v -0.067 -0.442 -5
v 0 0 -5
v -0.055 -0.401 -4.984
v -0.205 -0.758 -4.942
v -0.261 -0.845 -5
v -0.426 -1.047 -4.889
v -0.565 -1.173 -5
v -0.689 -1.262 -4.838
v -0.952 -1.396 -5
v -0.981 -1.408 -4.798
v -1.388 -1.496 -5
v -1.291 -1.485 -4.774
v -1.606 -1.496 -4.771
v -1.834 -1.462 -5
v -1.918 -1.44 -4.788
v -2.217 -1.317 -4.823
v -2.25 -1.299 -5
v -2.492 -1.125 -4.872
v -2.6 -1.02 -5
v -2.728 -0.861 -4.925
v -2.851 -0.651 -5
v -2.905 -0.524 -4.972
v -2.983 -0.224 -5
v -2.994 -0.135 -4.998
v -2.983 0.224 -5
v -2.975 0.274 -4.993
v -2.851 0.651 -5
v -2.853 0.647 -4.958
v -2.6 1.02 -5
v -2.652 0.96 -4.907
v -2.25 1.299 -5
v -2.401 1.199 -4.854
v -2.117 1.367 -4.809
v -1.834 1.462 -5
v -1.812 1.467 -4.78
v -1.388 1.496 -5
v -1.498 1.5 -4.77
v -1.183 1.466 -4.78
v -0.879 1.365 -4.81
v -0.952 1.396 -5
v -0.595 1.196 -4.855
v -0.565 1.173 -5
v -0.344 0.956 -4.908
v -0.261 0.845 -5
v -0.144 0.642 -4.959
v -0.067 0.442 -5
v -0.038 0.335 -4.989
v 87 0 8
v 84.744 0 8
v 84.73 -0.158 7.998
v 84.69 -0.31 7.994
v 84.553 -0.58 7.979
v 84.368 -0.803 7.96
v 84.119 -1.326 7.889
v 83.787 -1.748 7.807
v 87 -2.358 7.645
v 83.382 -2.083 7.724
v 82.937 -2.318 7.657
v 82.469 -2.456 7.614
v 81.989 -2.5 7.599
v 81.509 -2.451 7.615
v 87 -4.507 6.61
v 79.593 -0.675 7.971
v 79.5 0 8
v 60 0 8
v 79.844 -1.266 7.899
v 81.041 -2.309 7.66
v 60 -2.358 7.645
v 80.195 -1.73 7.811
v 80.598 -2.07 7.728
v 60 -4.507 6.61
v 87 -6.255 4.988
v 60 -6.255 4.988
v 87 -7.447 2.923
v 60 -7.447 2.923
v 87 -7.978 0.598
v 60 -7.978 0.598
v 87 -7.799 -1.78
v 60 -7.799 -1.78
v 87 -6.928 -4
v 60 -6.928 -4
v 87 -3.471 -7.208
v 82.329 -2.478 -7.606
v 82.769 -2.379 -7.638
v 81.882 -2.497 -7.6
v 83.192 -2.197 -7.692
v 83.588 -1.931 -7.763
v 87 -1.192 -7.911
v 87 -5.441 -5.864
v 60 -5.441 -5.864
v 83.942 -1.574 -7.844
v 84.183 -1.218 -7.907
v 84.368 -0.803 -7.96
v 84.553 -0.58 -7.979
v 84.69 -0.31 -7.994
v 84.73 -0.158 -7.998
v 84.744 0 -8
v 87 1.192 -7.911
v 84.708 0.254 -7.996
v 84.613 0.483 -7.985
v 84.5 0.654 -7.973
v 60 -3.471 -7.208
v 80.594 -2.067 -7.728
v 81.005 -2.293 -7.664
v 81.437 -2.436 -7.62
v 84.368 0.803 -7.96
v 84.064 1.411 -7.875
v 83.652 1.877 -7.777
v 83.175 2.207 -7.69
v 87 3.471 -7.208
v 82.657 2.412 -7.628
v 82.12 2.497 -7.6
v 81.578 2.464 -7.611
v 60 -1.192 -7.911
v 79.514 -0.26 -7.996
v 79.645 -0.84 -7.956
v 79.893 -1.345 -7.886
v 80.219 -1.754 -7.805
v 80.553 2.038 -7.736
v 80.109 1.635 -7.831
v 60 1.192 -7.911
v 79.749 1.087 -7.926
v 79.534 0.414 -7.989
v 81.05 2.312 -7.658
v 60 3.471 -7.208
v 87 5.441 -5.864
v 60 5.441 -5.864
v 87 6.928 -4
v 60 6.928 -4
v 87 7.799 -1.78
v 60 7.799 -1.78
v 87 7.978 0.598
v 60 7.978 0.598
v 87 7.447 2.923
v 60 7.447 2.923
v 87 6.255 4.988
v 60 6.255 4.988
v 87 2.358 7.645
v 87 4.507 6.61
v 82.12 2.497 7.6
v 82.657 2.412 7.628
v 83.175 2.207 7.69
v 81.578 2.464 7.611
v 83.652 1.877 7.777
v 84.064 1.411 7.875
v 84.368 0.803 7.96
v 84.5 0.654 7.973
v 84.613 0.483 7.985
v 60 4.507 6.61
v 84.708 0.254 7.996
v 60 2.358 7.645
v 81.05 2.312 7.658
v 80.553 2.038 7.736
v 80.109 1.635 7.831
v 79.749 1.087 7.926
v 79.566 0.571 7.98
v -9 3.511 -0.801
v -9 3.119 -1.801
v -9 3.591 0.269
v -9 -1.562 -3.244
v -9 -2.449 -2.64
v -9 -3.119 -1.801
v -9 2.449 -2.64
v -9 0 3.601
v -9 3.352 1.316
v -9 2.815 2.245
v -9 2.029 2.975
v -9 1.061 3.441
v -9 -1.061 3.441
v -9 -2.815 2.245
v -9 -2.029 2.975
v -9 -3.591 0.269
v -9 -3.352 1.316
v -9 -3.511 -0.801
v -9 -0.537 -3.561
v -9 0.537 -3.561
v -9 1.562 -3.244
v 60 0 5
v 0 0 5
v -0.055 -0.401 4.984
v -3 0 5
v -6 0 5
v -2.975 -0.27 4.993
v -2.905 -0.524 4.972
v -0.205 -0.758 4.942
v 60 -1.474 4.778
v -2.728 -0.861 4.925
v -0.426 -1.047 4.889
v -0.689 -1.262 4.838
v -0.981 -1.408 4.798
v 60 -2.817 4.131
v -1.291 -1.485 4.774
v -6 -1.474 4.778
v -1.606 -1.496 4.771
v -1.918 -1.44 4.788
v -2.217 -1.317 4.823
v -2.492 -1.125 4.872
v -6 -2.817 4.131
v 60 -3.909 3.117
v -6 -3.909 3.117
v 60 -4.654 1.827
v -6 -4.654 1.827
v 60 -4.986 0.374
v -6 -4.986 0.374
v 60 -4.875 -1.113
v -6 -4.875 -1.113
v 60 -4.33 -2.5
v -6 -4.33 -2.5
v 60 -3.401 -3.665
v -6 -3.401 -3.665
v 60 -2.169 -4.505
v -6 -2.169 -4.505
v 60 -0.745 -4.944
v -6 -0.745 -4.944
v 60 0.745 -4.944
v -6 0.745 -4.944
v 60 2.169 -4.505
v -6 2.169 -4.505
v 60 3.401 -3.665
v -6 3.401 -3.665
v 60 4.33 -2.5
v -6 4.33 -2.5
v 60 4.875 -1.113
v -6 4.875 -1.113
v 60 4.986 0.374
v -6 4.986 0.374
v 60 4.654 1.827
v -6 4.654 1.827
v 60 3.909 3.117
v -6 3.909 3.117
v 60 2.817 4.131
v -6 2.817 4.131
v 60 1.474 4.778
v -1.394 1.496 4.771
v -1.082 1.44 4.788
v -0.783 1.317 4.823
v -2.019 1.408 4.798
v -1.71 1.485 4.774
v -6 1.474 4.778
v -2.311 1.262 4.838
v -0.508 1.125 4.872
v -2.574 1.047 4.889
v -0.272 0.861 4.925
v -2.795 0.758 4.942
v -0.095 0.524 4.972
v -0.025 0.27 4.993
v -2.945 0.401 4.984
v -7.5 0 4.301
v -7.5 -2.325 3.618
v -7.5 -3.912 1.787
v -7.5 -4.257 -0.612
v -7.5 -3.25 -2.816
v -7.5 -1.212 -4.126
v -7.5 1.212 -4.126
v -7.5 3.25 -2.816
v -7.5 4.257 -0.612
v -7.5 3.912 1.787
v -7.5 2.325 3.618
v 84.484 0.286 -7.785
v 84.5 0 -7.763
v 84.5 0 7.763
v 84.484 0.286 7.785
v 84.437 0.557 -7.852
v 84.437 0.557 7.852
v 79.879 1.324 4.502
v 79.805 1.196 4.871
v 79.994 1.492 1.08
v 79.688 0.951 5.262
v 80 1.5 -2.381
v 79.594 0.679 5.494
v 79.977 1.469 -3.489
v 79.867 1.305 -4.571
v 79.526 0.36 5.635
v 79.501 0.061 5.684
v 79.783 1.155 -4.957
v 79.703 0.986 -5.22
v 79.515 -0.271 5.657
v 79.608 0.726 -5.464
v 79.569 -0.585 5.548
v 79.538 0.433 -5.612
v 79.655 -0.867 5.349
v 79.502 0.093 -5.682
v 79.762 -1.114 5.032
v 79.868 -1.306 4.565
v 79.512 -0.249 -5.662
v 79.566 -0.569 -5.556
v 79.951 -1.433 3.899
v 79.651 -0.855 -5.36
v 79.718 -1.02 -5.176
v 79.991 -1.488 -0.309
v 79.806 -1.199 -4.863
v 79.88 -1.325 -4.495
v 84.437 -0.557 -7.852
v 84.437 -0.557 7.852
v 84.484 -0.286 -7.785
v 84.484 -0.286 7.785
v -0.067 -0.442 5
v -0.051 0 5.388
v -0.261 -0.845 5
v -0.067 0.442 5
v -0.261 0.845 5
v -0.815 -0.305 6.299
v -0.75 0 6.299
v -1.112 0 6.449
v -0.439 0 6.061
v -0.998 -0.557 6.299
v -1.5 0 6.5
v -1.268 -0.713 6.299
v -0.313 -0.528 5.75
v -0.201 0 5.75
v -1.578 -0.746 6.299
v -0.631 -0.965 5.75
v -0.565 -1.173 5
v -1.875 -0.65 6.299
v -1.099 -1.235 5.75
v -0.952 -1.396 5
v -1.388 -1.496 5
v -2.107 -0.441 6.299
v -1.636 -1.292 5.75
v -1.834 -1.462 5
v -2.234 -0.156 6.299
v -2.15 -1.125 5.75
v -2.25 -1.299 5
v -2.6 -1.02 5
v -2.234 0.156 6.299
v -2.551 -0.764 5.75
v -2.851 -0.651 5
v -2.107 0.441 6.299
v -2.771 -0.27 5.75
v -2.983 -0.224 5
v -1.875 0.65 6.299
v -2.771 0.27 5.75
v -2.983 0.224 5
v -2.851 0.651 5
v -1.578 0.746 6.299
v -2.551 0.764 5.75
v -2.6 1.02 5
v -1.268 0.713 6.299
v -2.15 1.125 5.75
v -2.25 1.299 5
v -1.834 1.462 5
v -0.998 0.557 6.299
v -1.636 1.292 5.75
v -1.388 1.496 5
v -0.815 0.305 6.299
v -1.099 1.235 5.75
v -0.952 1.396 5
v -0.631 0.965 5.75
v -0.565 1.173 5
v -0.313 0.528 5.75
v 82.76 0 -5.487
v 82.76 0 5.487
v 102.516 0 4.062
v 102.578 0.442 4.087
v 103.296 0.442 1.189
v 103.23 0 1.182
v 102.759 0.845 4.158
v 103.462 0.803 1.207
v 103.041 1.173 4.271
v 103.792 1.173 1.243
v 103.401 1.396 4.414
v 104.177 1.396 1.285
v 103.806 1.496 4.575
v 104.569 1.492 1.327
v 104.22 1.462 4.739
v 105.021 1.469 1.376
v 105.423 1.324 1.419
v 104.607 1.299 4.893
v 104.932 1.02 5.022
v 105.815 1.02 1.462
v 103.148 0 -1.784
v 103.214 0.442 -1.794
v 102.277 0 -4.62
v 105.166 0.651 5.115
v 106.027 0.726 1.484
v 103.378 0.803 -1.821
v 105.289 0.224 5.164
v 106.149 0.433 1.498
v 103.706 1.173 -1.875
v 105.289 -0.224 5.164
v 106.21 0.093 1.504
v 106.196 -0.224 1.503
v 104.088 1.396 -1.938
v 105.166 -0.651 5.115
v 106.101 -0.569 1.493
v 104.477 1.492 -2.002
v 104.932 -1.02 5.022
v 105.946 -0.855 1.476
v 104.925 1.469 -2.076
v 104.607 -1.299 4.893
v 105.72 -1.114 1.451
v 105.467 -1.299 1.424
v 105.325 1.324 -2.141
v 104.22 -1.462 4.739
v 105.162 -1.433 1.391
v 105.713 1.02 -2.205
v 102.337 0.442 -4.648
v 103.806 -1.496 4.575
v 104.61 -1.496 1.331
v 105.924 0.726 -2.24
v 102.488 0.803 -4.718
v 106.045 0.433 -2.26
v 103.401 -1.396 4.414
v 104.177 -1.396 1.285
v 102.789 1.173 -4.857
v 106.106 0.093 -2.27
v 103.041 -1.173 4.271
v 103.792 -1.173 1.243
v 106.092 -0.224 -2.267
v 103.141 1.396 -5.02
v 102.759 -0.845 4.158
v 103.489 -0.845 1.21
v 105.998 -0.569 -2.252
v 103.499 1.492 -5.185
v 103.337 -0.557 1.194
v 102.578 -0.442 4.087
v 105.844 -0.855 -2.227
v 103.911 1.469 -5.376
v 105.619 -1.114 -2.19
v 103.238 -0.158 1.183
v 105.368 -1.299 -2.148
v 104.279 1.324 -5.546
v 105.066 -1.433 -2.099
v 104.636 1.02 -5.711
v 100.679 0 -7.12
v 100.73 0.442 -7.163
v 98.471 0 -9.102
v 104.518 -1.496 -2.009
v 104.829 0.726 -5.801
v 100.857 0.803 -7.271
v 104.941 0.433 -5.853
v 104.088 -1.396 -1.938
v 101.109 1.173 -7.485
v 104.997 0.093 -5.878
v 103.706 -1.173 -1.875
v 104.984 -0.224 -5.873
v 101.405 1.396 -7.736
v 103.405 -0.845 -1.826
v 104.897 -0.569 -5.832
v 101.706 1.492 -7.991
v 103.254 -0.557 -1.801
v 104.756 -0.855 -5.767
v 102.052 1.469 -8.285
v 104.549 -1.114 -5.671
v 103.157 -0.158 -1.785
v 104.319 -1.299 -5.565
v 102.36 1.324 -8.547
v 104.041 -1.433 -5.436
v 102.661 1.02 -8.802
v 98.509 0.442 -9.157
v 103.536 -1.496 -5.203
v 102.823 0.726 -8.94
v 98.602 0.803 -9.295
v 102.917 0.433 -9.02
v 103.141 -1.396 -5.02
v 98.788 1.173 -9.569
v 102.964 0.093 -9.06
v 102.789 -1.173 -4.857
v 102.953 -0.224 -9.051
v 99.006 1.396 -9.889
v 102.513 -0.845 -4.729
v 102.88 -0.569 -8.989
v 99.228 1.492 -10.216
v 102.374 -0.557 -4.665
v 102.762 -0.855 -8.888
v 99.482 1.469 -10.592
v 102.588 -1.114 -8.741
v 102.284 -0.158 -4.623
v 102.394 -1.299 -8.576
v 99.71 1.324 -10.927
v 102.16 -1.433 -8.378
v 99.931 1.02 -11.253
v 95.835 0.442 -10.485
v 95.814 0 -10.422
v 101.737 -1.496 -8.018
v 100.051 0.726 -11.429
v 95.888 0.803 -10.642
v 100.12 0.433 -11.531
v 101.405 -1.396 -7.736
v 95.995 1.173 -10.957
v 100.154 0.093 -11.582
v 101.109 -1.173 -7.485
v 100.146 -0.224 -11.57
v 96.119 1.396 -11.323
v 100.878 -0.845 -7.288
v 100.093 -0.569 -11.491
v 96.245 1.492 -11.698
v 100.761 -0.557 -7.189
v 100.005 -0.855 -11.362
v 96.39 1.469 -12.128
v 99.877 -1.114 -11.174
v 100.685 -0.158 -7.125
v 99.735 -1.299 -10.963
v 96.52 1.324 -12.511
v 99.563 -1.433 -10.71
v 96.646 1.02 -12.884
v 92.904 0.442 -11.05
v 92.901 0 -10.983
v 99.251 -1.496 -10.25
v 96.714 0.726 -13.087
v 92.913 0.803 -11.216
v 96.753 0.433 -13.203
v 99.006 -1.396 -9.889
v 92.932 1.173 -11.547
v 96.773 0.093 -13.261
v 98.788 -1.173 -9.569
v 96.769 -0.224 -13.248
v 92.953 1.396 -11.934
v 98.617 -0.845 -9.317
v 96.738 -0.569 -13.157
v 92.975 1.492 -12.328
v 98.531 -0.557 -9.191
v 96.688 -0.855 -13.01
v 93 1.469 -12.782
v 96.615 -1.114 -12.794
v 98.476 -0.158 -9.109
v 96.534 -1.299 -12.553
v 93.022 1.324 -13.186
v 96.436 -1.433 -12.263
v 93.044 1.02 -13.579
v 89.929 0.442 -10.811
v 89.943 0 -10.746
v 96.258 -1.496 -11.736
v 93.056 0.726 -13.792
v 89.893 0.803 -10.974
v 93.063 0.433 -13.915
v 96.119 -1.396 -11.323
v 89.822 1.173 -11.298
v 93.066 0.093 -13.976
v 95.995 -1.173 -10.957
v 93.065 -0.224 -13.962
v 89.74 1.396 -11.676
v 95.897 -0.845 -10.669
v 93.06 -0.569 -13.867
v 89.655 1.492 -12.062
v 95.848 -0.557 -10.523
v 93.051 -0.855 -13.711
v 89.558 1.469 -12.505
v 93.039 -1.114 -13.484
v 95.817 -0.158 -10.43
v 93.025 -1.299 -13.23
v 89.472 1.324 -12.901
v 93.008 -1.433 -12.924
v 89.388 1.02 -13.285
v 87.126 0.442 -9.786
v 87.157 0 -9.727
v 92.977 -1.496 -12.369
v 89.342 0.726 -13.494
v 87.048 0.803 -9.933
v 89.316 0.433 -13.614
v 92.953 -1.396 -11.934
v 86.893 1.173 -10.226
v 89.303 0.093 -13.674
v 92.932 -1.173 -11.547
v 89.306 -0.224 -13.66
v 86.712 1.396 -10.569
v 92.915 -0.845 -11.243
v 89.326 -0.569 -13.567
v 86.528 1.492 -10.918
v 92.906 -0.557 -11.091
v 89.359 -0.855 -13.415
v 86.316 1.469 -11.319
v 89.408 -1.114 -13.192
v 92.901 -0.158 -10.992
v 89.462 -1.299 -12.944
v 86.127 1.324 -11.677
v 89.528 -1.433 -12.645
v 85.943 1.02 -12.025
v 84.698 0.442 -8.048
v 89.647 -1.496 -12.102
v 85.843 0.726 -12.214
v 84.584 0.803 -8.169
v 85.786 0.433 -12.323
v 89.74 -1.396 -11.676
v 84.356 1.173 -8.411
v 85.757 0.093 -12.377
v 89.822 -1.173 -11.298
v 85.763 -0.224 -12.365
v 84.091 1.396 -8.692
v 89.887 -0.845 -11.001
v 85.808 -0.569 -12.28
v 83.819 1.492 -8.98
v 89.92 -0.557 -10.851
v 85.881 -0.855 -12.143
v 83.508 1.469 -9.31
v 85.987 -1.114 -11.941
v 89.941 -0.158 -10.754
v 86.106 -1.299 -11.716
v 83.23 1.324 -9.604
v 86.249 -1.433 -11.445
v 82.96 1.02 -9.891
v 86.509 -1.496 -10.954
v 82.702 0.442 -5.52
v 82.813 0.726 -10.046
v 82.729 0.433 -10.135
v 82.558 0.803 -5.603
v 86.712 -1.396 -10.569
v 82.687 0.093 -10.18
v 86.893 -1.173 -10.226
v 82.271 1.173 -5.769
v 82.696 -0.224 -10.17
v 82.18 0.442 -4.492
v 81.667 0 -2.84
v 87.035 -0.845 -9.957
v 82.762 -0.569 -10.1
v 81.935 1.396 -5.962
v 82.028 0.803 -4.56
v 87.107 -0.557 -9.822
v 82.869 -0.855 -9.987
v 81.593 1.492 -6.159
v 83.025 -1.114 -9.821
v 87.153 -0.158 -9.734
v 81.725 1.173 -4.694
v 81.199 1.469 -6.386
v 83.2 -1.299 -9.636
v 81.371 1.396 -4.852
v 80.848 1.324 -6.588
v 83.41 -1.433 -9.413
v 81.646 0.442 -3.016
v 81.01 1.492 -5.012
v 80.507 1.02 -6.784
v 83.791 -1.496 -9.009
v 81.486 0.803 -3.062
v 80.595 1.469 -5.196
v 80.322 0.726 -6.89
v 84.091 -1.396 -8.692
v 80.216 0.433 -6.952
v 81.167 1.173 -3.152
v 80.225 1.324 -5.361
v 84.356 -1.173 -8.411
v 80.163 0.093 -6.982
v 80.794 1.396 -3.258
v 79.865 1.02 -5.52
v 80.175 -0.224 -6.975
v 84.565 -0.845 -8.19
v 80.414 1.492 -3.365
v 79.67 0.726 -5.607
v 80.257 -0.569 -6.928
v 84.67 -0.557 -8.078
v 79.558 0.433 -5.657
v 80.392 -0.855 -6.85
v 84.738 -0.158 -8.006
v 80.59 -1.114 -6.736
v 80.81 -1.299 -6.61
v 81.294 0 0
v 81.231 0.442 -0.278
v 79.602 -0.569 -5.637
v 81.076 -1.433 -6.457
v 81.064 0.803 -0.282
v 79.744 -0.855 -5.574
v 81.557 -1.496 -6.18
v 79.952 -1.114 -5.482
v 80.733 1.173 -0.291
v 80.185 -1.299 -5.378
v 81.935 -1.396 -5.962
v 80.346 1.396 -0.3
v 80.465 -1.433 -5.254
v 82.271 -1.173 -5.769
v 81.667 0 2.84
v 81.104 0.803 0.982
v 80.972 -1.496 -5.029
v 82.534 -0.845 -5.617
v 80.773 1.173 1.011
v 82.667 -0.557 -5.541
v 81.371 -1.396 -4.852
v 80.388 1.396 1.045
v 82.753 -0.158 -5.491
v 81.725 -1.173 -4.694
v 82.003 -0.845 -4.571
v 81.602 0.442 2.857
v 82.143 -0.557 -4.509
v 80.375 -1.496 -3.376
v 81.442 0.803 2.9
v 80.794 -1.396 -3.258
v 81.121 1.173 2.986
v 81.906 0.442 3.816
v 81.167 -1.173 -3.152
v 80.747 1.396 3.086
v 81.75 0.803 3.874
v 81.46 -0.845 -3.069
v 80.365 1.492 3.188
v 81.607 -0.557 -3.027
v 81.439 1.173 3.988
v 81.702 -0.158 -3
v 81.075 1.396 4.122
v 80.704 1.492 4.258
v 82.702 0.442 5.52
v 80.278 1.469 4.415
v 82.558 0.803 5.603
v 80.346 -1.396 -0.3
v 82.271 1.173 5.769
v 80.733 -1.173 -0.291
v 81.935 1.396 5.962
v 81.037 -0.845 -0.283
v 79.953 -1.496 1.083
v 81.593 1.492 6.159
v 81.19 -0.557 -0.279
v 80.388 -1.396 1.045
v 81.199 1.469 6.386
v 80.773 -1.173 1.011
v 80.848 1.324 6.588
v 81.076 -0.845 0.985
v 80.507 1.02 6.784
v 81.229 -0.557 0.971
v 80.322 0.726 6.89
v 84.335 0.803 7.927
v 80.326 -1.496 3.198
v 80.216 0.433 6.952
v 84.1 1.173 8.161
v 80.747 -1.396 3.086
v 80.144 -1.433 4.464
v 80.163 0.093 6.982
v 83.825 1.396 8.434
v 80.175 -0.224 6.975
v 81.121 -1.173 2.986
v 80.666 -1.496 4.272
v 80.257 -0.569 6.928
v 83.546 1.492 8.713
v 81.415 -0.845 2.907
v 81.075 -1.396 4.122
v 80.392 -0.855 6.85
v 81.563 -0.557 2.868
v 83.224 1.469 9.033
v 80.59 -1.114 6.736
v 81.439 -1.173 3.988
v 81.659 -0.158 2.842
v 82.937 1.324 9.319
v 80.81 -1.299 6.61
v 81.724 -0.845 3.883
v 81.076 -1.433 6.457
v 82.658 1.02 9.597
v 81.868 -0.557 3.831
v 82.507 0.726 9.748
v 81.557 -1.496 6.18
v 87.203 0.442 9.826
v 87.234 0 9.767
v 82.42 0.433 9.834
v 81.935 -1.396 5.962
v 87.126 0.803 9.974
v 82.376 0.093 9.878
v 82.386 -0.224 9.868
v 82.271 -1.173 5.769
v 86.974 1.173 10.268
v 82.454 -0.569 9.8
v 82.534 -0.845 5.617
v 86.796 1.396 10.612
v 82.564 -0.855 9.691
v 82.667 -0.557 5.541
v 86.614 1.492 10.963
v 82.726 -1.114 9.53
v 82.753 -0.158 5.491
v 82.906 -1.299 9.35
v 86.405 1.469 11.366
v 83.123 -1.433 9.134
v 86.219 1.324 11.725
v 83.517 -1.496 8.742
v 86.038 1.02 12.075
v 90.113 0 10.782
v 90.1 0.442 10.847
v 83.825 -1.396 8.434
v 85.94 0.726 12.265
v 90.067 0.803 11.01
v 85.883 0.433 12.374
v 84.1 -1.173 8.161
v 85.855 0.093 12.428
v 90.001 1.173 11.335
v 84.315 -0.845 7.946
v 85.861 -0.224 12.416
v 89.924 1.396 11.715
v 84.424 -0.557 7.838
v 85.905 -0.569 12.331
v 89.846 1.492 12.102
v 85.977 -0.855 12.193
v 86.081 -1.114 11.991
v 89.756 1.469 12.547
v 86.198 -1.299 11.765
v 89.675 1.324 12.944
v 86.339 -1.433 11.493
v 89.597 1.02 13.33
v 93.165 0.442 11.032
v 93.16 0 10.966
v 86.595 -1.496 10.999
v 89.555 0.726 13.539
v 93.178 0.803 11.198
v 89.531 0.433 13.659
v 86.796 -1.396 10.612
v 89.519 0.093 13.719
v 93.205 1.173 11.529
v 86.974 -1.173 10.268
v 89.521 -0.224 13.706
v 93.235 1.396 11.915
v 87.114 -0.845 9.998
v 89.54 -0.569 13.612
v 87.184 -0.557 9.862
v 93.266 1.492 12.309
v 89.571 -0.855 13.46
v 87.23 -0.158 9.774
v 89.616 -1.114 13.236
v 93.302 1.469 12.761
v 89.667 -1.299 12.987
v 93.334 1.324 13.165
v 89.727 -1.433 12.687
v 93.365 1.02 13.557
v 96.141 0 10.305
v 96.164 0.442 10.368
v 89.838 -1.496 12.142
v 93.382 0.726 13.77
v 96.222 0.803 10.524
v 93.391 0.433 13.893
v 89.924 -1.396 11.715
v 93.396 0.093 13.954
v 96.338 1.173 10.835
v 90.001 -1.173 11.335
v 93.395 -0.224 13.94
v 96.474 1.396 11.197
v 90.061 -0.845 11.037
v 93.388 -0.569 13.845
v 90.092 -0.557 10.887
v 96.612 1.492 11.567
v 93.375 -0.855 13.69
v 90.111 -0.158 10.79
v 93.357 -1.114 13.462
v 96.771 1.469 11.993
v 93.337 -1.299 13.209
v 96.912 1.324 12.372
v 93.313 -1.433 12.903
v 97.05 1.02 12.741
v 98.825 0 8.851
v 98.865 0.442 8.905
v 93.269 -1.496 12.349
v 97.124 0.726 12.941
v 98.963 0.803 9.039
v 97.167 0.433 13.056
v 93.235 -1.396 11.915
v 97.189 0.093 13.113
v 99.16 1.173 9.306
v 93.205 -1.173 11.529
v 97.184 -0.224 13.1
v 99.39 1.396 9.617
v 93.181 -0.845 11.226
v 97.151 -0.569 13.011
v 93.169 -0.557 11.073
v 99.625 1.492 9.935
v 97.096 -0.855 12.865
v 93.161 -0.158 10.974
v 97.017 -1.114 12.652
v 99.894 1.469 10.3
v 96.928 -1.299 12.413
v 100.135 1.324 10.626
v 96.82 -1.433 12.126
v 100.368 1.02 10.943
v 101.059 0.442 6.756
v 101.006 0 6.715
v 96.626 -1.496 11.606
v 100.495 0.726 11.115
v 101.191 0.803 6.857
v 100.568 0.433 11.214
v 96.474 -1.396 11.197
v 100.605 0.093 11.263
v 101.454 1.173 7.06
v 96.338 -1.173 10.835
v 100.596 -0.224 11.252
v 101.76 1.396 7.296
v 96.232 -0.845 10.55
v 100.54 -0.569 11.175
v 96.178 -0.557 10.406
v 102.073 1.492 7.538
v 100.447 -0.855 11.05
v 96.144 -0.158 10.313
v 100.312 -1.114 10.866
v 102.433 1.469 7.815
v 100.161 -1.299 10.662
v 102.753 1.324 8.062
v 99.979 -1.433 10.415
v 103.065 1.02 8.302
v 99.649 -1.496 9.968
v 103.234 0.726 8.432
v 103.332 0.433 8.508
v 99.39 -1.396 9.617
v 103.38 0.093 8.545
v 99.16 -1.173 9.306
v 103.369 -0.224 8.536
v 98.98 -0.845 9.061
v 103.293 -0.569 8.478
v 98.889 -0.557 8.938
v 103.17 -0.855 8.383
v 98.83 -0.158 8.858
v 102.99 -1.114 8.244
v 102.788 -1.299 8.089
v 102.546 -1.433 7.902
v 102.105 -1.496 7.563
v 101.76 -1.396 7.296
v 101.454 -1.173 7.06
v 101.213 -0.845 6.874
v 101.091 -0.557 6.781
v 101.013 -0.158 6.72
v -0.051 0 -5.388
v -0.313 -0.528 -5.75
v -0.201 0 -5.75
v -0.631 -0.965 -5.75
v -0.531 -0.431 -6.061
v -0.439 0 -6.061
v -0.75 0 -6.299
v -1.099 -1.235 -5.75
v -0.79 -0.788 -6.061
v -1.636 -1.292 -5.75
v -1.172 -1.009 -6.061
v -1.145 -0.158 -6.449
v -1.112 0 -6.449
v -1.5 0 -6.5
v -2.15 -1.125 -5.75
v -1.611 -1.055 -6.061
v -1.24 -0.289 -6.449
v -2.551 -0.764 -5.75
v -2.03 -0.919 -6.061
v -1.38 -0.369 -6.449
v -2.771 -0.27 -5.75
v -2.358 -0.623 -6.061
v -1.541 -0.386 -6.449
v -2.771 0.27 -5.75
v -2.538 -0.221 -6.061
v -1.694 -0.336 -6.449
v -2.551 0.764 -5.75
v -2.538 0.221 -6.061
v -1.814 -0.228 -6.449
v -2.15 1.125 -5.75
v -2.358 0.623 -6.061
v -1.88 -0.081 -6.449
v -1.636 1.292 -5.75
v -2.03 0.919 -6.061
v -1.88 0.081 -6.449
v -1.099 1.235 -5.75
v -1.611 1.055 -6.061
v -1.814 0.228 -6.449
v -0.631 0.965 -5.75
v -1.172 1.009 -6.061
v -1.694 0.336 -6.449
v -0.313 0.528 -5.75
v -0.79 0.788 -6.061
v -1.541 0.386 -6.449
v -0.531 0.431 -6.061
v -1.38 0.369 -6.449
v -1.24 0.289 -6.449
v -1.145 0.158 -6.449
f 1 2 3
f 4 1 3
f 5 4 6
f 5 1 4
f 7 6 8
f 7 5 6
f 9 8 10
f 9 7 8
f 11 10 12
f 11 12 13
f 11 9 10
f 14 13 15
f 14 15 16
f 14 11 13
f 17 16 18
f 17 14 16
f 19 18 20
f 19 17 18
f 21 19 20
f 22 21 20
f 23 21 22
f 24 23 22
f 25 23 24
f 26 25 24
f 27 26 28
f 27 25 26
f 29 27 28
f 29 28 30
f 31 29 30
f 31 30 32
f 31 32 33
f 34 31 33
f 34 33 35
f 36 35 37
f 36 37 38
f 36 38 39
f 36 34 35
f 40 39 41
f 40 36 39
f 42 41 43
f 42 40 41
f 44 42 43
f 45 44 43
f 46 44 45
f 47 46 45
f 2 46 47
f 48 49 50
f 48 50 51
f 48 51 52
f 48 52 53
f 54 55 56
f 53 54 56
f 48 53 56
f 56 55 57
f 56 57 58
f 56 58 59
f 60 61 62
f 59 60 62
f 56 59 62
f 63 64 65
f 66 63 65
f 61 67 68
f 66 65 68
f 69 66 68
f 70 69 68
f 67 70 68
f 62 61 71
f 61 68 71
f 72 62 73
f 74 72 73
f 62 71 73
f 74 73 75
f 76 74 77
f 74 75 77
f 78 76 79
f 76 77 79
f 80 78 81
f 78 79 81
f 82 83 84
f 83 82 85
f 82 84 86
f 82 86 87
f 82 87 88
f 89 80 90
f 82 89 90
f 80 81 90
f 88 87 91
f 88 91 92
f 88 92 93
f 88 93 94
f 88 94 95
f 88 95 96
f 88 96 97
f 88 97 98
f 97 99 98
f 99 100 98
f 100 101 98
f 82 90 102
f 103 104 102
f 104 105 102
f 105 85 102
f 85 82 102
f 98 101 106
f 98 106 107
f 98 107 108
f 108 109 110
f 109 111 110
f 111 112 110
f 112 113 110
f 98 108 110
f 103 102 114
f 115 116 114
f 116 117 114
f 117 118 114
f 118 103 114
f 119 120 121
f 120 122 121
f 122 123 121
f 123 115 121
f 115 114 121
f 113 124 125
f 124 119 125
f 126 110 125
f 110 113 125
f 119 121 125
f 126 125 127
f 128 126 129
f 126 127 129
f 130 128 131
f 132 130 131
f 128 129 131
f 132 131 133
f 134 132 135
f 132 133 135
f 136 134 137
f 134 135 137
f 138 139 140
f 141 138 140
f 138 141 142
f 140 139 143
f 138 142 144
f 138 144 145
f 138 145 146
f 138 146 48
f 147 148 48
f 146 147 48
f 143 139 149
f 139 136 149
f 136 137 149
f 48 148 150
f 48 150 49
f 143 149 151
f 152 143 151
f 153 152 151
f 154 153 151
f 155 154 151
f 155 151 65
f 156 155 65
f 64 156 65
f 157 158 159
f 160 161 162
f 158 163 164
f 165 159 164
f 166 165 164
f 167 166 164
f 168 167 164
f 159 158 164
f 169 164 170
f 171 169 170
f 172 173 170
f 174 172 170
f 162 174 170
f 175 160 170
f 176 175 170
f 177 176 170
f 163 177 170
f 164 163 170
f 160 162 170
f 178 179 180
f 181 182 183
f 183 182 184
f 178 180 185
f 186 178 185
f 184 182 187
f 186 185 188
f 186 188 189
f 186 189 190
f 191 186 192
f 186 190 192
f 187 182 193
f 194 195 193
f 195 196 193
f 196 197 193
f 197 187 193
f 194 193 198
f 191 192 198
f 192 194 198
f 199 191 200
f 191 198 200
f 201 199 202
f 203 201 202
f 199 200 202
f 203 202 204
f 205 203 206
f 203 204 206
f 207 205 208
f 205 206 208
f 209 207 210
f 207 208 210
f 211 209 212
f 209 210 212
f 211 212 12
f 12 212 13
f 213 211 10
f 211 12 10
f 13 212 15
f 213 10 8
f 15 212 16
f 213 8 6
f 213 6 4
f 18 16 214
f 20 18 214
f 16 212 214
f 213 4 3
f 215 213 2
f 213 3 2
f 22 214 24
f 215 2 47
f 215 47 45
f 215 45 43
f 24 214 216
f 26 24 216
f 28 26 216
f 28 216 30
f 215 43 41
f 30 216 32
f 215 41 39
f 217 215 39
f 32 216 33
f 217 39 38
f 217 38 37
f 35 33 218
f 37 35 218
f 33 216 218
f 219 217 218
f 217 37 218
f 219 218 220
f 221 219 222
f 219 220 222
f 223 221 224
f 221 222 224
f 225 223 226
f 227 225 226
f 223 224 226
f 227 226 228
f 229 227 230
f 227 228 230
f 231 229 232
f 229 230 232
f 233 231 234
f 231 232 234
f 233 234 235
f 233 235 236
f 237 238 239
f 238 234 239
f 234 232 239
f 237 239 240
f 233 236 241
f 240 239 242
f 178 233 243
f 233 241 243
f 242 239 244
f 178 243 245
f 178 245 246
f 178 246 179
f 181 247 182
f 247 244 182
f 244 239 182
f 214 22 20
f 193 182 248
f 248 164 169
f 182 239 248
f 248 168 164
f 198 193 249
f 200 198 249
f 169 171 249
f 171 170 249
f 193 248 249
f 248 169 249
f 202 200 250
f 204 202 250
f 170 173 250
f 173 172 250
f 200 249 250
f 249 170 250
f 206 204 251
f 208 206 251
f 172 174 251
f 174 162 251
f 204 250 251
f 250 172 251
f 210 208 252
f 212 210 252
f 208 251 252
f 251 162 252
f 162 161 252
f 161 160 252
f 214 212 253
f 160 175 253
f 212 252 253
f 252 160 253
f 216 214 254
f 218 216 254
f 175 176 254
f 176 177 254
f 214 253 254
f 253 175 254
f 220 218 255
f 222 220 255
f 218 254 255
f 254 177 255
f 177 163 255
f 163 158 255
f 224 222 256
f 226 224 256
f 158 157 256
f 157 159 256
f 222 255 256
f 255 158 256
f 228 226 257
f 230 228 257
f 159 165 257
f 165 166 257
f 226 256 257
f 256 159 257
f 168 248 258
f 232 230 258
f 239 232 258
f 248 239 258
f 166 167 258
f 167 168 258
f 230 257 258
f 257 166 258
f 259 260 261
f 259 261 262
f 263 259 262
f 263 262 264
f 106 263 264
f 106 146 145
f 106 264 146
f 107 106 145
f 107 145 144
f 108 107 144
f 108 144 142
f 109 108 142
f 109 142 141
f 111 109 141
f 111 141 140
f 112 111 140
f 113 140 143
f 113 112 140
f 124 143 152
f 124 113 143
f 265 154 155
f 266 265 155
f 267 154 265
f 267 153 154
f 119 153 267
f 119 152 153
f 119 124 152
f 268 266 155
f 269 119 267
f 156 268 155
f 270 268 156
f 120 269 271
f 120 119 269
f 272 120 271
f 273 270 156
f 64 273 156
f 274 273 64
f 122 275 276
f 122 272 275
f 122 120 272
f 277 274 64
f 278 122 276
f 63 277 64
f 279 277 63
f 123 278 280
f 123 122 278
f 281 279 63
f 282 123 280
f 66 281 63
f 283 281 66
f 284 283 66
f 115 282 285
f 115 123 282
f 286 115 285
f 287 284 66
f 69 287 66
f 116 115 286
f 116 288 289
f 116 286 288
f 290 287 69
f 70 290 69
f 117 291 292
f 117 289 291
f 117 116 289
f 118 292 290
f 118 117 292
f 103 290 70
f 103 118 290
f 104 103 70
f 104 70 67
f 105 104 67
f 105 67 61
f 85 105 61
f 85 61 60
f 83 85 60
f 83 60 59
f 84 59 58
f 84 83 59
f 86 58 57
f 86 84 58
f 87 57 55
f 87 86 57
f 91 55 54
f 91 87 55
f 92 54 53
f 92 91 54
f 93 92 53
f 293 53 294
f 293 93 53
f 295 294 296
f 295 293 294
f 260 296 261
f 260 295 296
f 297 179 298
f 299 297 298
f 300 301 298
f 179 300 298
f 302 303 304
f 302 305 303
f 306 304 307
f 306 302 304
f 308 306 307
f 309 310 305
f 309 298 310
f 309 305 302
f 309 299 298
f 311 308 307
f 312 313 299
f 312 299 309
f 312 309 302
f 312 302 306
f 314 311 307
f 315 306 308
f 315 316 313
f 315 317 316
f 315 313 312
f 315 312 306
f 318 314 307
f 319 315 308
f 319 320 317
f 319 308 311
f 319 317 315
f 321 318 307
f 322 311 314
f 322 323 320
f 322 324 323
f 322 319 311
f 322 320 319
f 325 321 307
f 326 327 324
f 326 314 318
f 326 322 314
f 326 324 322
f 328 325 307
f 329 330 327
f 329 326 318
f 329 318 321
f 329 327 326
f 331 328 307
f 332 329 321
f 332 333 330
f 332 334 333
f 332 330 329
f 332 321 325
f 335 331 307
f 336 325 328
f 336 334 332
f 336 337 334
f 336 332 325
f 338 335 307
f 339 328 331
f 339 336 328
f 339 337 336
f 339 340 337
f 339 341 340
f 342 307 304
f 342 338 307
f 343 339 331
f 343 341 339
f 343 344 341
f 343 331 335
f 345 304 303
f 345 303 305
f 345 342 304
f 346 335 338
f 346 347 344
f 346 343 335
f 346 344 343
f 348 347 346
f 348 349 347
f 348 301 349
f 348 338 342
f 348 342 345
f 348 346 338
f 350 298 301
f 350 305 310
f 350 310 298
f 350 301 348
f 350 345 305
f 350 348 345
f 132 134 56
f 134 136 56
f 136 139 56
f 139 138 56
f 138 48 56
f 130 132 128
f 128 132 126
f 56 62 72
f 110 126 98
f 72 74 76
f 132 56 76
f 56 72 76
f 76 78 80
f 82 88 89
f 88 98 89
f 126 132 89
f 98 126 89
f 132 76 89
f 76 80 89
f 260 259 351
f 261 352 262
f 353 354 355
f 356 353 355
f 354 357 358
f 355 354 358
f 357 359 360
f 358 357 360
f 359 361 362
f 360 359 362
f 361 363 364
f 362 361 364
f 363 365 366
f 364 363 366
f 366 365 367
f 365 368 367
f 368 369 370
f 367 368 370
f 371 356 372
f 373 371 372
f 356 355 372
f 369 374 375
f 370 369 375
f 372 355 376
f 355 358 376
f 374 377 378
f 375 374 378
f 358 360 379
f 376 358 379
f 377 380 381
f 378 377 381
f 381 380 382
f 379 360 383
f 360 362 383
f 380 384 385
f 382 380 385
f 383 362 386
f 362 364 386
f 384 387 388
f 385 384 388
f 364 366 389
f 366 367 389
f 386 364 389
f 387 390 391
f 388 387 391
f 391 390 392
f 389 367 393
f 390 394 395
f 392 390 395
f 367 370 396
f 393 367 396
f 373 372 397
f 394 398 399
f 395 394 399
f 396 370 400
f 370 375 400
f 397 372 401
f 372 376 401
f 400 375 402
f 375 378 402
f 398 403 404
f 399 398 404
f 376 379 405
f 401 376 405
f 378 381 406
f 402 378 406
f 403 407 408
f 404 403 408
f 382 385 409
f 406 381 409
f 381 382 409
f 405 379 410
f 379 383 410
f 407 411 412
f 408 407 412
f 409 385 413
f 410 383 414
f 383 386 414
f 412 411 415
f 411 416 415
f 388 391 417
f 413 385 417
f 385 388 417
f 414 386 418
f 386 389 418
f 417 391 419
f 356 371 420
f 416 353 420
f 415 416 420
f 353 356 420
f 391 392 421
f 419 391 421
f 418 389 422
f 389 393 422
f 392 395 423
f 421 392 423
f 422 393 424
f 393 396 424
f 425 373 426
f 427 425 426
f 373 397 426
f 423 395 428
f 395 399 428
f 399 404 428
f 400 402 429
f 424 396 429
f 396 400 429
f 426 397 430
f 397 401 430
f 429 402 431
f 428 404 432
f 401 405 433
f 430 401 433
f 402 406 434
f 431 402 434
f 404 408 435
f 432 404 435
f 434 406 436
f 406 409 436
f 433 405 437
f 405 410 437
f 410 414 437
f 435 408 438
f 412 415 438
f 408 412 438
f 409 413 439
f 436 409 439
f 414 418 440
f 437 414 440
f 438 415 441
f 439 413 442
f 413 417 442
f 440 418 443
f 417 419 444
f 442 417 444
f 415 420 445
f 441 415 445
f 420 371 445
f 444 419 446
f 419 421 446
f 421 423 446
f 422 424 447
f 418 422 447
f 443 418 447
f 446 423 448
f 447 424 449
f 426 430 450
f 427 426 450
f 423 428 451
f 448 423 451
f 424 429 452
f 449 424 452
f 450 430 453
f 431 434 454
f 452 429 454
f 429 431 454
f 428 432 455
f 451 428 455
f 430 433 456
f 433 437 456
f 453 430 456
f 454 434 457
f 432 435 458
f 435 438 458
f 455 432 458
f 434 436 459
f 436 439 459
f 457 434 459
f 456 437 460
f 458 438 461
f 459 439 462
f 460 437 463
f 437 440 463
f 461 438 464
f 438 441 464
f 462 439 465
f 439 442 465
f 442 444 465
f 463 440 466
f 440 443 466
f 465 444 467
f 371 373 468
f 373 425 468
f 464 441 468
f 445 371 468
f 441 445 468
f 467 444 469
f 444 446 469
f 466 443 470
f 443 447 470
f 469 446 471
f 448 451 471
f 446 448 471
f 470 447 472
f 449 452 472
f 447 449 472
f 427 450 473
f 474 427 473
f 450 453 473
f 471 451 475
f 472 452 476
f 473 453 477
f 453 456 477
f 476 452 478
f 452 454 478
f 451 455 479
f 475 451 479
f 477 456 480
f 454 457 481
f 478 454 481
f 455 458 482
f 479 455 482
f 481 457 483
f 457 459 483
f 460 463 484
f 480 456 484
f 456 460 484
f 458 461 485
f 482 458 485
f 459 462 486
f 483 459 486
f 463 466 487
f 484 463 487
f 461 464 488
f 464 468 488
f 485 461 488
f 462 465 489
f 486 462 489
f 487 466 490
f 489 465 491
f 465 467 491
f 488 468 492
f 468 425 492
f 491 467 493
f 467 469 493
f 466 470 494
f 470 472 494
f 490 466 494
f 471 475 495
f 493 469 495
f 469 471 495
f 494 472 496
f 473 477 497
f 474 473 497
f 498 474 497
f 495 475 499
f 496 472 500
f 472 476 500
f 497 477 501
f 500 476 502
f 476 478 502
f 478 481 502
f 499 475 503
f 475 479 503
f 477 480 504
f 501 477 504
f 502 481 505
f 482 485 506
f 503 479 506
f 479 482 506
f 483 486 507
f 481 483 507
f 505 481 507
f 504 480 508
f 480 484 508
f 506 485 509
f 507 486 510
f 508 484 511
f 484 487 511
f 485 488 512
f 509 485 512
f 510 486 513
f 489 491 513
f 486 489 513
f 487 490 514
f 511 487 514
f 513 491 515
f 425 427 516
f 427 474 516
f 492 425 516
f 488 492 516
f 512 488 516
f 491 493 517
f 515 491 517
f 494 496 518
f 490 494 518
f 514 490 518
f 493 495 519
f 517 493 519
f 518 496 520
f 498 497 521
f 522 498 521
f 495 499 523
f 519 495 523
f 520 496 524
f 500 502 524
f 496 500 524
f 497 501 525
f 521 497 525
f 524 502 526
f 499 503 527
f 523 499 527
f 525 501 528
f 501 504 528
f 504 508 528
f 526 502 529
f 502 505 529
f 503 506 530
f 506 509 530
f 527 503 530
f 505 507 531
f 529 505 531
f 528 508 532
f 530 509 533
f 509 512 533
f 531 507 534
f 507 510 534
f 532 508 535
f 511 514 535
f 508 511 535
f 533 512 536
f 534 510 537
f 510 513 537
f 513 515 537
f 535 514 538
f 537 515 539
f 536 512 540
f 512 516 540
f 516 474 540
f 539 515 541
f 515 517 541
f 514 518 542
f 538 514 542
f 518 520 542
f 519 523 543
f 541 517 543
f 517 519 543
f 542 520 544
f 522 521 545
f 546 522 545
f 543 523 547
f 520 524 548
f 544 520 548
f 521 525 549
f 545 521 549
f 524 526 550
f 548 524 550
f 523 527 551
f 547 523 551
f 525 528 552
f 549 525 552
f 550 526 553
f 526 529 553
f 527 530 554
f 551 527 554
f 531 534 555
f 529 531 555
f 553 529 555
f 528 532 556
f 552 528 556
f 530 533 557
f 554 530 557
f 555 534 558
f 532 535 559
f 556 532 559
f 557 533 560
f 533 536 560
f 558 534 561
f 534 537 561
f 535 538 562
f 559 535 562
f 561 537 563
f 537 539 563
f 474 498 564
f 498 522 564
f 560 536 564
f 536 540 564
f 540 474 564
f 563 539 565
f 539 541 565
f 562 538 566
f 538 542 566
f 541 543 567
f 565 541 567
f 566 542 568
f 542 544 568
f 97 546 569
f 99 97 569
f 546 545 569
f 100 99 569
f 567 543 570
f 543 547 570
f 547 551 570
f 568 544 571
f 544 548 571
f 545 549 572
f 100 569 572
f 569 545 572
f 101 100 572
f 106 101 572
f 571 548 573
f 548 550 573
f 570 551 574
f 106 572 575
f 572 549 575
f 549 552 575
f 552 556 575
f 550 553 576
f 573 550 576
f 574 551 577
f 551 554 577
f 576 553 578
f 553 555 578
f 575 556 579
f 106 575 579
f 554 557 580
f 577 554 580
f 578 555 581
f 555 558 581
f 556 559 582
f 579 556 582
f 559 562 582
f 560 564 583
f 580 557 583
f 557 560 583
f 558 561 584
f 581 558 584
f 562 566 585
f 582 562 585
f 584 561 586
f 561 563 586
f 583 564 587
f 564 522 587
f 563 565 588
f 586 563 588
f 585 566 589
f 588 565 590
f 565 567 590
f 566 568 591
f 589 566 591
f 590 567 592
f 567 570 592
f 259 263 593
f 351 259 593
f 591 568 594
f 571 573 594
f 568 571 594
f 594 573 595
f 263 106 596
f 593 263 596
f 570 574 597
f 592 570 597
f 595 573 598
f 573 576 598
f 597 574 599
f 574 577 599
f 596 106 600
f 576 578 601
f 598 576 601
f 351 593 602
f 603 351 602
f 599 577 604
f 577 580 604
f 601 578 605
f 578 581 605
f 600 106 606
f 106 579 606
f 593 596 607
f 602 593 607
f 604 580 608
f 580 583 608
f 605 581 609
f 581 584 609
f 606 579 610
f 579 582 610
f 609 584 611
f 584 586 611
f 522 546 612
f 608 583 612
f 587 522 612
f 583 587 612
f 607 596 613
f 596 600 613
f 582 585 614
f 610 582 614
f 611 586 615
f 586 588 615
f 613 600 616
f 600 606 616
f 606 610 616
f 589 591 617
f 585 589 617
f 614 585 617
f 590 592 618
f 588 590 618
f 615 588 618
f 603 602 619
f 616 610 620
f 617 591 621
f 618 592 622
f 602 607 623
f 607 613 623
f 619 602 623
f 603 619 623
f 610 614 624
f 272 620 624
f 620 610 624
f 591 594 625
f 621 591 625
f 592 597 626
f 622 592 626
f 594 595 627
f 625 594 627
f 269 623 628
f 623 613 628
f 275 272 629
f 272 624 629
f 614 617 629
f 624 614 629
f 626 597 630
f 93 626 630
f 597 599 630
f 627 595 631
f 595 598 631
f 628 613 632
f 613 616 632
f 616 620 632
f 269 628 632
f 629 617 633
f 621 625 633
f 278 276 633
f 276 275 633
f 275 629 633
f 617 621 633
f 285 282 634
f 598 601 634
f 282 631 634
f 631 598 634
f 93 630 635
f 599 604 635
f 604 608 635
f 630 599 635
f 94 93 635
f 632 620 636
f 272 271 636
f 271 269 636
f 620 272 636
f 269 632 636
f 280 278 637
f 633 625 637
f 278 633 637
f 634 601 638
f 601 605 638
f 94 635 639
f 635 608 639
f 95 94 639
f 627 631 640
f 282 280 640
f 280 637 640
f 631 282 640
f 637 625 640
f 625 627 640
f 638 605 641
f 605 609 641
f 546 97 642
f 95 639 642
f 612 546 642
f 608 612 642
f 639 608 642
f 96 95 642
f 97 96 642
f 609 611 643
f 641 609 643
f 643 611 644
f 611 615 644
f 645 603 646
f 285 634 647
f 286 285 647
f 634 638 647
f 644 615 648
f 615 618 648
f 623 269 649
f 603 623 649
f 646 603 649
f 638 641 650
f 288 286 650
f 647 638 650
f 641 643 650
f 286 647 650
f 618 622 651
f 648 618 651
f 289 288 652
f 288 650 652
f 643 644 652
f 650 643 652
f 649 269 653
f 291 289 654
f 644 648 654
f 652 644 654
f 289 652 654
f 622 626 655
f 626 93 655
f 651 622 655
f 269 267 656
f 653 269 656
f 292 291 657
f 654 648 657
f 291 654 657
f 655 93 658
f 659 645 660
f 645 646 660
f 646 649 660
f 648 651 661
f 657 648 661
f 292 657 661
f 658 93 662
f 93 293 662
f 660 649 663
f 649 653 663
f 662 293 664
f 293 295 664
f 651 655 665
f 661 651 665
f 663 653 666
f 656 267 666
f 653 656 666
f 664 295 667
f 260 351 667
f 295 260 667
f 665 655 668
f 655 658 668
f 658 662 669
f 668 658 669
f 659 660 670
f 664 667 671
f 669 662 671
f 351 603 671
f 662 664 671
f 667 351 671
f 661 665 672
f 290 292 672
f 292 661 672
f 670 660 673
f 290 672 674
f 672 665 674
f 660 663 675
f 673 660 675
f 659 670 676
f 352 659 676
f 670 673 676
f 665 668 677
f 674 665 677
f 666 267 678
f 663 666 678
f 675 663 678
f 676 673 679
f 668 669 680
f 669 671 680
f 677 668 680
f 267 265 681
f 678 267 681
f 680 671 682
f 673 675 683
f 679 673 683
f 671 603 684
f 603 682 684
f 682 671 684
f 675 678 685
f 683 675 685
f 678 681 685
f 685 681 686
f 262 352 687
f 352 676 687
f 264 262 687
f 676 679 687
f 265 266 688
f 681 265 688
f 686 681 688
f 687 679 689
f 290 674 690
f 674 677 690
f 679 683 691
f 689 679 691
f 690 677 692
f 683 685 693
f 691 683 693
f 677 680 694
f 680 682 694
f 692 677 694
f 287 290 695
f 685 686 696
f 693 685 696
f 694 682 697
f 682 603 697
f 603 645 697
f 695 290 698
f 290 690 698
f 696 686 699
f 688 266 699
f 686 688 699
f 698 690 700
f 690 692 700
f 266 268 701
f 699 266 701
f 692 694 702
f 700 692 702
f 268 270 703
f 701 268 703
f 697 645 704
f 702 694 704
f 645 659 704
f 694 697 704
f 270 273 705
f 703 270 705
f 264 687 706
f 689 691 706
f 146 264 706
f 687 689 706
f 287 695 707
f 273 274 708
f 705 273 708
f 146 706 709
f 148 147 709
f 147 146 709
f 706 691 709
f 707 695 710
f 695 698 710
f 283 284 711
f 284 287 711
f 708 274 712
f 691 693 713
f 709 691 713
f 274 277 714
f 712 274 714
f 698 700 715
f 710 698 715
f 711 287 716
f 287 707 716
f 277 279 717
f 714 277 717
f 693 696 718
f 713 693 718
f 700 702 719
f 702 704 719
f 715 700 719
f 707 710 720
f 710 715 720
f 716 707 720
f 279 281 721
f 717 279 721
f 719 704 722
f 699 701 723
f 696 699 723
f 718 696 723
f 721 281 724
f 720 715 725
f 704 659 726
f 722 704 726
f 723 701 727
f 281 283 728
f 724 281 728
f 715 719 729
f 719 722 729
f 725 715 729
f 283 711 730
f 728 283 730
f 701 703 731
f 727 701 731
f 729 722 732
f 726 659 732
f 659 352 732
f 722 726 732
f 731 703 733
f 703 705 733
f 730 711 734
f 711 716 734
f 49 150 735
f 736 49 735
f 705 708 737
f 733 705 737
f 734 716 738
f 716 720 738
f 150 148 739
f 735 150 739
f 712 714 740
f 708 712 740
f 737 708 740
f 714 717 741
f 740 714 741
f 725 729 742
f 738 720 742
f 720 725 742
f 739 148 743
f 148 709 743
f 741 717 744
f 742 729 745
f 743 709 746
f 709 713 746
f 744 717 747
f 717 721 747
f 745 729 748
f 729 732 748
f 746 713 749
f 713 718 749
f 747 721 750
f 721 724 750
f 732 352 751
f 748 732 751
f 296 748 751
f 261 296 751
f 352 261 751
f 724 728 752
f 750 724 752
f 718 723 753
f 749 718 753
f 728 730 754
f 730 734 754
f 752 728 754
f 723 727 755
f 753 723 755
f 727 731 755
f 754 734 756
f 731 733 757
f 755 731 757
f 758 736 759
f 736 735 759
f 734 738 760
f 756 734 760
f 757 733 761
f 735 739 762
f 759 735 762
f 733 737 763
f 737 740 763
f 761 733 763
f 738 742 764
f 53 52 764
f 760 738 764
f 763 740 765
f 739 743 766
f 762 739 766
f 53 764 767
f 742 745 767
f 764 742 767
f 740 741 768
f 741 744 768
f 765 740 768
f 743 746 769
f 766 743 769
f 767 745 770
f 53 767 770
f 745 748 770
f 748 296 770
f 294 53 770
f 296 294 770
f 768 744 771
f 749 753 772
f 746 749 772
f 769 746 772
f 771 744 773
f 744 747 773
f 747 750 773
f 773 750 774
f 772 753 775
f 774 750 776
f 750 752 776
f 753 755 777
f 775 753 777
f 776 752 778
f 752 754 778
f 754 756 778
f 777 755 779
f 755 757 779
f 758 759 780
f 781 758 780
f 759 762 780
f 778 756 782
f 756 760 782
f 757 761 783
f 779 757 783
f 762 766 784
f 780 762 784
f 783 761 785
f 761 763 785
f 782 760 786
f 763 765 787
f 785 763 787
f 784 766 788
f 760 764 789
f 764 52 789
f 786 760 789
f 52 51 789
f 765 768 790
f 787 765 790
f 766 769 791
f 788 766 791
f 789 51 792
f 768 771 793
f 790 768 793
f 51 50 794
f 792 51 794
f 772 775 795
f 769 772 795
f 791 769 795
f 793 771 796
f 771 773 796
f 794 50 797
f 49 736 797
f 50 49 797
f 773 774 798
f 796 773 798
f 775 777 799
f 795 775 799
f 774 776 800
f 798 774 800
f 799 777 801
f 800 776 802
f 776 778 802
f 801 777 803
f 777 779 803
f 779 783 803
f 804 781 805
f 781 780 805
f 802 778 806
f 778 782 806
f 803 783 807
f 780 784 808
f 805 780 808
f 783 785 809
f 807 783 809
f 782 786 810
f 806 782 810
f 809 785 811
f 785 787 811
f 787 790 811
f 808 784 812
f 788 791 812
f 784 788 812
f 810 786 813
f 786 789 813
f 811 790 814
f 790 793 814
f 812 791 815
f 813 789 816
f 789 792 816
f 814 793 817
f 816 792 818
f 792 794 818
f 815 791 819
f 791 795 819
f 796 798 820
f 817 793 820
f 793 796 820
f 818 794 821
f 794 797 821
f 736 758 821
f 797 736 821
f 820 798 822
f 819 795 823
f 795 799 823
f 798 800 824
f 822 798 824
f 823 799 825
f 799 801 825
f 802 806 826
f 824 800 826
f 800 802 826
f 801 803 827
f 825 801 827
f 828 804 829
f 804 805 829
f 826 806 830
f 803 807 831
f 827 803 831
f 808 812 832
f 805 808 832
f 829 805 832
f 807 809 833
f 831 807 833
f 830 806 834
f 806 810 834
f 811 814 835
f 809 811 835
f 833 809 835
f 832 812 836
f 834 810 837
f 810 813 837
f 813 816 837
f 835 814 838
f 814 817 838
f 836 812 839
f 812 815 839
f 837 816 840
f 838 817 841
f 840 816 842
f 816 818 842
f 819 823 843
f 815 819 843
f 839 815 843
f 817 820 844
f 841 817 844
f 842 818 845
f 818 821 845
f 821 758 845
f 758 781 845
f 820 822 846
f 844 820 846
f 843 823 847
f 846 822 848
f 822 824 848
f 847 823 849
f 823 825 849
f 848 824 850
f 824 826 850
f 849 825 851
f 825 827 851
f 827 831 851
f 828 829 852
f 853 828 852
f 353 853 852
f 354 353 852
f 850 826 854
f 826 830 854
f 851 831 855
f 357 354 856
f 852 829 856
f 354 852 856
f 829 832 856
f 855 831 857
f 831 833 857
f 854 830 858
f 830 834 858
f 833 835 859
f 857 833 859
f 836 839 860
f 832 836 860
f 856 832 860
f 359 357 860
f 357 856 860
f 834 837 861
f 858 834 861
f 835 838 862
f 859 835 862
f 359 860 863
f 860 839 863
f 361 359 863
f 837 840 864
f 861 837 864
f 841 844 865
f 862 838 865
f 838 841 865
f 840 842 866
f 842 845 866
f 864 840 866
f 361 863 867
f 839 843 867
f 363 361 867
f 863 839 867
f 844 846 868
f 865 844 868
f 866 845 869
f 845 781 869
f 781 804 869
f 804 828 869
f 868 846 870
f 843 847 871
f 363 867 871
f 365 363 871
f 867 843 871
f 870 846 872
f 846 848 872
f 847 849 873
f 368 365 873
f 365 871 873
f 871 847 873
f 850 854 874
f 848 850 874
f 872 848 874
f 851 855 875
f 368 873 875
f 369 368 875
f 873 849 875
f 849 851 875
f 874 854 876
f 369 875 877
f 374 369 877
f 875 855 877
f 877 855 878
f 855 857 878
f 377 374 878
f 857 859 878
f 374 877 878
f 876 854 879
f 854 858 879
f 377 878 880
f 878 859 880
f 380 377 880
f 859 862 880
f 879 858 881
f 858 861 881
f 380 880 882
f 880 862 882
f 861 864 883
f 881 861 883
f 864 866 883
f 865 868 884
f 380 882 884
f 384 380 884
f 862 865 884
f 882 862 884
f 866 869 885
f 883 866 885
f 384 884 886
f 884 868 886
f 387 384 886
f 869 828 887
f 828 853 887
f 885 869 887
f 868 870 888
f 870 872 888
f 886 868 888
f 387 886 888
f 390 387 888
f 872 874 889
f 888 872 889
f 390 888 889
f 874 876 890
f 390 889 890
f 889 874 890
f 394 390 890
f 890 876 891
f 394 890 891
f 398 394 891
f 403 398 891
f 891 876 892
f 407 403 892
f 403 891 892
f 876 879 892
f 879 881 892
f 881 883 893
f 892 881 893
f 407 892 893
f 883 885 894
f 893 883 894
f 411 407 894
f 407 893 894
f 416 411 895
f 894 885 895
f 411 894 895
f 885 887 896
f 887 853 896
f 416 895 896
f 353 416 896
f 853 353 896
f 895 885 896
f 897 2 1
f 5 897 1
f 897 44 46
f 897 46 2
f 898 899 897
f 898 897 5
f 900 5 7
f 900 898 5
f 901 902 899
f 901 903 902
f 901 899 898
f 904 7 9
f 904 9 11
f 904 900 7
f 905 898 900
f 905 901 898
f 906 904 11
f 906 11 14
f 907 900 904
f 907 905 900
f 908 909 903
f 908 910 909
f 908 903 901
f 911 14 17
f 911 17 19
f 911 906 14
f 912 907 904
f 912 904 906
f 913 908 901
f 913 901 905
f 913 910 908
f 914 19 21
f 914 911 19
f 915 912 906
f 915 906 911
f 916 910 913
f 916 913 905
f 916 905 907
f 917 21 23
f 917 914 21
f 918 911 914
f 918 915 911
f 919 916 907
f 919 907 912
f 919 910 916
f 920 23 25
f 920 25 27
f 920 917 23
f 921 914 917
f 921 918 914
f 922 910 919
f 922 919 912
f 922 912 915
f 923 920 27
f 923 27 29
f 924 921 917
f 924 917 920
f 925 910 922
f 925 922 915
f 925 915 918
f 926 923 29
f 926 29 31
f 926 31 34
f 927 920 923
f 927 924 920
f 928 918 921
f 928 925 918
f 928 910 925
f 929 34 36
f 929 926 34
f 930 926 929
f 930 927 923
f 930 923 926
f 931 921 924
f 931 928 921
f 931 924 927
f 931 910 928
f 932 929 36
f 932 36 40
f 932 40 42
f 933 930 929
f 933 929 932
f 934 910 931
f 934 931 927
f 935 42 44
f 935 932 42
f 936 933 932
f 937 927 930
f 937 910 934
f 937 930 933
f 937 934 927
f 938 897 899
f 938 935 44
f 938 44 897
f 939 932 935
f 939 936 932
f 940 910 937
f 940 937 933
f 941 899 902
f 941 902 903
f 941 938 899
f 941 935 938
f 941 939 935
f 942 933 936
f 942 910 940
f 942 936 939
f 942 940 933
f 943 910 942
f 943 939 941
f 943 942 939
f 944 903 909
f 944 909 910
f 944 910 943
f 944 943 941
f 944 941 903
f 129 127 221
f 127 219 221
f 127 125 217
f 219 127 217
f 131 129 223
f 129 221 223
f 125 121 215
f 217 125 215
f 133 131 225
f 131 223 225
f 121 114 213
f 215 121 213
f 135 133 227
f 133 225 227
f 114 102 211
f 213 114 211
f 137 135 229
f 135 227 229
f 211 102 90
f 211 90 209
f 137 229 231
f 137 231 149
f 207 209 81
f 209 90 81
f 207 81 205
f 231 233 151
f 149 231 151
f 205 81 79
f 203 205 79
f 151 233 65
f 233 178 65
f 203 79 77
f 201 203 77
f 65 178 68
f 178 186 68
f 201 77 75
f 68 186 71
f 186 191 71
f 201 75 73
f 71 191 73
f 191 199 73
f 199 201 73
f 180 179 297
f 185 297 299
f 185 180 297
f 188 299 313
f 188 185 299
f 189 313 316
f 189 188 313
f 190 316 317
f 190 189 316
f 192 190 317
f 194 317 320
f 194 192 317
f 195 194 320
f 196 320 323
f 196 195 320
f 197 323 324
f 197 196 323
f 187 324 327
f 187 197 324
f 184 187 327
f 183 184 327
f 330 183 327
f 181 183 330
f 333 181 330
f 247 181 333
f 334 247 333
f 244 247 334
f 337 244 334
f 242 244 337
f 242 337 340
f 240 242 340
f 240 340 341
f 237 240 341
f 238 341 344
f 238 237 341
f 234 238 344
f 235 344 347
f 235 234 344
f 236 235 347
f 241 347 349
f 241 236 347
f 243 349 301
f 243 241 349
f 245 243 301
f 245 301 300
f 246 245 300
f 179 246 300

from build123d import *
from build123d.topology import SkipClean

# Parameters (mm, degrees)
CHAMFER1_SIZE           = 3
CHAMFER1_SIZE2          = 1.398922974
SKETCH2_W               = 1.5
SKETCH2_H               = 13
FILLET1_R               = 1.5
CUT_EXTRUDE1_DEPTH      = 88.732548122
CUT_EXTRUDE1_DEPTH_BACK = 88.732548122
SKETCH3_R               = 2.5
SKETCH5_R               = 1.5


with BuildPart() as part:
    # Sketch1 → Revolve1 (revolve)
    with BuildSketch(Plane(origin=(0, 0, 0), x_dir=(1, 0, 0), z_dir=(0, 1, 0)), mode=Mode.PRIVATE) as revolve1_sk:
        Polygon((0, 5), (-9, 5), (-9, 0), (87, 0), (87, 8), (60, 8), (60, 5), align=None)
    revolve(revolve1_sk.sketch.rotate(Axis((0, 0, 0), (1, 0, 0)), 180), axis=Axis((0, 0, 0), (1, 0, 0)))

    # Chamfer1
    chamfer1_edges = [part.edges().sort_by_distance(p)[0] for p in [
        (-9, 0, -5),
    ]]
    chamfer1_side = [part.faces().sort_by_distance(p)[0] for p in [
        (25.5, 0, -5),
    ]]
    chamfer(chamfer1_edges, length=CHAMFER1_SIZE, length2=CHAMFER1_SIZE2, reference=chamfer1_side[0])

    # Sketch2 → Revolve2 (revolve)
    with BuildSketch(Plane(origin=(0, 0, 0), x_dir=(1, 0, 0), z_dir=(0, 1, 0))):
        with Locations((-0.75, 0)):
            Rectangle(SKETCH2_W, SKETCH2_H)
    revolve(axis=Axis((-1.5, 0, -7.755836722), (0, 0, -1)))

    # Fillet1
    fillet1_edges = [part.edges().sort_by_distance(p)[0] for p in [
        (-3, 0, -6.5),
        (-3, 0, 6.5),
    ]]
    fillet(fillet1_edges, radius=FILLET1_R - 0.0001)  # a hair under: the kernel refuses the full size

    # Sketch3 → Cut-Extrude1 (cut, two sides: drawn at the far end of the back side and taken through both)
    with BuildSketch(Plane.XY.offset(-CUT_EXTRUDE1_DEPTH_BACK)):
        with Locations((82, 0)):
            Circle(SKETCH3_R)
    extrude(amount=CUT_EXTRUDE1_DEPTH + CUT_EXTRUDE1_DEPTH_BACK, mode=Mode.SUBTRACT)

    # Sketch5 → Revolve3 (revolve)
    with SkipClean():  # the faces are left unmerged after this step: merging them gives an invalid solid
        with BuildSketch(Plane.XY, mode=Mode.PRIVATE) as revolve3_sk:
            with Locations((79.793803516, 0)):
                Circle(SKETCH5_R)
        revolve(revolve3_sk.sketch.rotate(Axis((92.293803516, 0, 0), (0, 1, 0)), 158.32912017), axis=Axis((92.293803516, 0, 0), (0, 1, 0)))


solid = part.part
